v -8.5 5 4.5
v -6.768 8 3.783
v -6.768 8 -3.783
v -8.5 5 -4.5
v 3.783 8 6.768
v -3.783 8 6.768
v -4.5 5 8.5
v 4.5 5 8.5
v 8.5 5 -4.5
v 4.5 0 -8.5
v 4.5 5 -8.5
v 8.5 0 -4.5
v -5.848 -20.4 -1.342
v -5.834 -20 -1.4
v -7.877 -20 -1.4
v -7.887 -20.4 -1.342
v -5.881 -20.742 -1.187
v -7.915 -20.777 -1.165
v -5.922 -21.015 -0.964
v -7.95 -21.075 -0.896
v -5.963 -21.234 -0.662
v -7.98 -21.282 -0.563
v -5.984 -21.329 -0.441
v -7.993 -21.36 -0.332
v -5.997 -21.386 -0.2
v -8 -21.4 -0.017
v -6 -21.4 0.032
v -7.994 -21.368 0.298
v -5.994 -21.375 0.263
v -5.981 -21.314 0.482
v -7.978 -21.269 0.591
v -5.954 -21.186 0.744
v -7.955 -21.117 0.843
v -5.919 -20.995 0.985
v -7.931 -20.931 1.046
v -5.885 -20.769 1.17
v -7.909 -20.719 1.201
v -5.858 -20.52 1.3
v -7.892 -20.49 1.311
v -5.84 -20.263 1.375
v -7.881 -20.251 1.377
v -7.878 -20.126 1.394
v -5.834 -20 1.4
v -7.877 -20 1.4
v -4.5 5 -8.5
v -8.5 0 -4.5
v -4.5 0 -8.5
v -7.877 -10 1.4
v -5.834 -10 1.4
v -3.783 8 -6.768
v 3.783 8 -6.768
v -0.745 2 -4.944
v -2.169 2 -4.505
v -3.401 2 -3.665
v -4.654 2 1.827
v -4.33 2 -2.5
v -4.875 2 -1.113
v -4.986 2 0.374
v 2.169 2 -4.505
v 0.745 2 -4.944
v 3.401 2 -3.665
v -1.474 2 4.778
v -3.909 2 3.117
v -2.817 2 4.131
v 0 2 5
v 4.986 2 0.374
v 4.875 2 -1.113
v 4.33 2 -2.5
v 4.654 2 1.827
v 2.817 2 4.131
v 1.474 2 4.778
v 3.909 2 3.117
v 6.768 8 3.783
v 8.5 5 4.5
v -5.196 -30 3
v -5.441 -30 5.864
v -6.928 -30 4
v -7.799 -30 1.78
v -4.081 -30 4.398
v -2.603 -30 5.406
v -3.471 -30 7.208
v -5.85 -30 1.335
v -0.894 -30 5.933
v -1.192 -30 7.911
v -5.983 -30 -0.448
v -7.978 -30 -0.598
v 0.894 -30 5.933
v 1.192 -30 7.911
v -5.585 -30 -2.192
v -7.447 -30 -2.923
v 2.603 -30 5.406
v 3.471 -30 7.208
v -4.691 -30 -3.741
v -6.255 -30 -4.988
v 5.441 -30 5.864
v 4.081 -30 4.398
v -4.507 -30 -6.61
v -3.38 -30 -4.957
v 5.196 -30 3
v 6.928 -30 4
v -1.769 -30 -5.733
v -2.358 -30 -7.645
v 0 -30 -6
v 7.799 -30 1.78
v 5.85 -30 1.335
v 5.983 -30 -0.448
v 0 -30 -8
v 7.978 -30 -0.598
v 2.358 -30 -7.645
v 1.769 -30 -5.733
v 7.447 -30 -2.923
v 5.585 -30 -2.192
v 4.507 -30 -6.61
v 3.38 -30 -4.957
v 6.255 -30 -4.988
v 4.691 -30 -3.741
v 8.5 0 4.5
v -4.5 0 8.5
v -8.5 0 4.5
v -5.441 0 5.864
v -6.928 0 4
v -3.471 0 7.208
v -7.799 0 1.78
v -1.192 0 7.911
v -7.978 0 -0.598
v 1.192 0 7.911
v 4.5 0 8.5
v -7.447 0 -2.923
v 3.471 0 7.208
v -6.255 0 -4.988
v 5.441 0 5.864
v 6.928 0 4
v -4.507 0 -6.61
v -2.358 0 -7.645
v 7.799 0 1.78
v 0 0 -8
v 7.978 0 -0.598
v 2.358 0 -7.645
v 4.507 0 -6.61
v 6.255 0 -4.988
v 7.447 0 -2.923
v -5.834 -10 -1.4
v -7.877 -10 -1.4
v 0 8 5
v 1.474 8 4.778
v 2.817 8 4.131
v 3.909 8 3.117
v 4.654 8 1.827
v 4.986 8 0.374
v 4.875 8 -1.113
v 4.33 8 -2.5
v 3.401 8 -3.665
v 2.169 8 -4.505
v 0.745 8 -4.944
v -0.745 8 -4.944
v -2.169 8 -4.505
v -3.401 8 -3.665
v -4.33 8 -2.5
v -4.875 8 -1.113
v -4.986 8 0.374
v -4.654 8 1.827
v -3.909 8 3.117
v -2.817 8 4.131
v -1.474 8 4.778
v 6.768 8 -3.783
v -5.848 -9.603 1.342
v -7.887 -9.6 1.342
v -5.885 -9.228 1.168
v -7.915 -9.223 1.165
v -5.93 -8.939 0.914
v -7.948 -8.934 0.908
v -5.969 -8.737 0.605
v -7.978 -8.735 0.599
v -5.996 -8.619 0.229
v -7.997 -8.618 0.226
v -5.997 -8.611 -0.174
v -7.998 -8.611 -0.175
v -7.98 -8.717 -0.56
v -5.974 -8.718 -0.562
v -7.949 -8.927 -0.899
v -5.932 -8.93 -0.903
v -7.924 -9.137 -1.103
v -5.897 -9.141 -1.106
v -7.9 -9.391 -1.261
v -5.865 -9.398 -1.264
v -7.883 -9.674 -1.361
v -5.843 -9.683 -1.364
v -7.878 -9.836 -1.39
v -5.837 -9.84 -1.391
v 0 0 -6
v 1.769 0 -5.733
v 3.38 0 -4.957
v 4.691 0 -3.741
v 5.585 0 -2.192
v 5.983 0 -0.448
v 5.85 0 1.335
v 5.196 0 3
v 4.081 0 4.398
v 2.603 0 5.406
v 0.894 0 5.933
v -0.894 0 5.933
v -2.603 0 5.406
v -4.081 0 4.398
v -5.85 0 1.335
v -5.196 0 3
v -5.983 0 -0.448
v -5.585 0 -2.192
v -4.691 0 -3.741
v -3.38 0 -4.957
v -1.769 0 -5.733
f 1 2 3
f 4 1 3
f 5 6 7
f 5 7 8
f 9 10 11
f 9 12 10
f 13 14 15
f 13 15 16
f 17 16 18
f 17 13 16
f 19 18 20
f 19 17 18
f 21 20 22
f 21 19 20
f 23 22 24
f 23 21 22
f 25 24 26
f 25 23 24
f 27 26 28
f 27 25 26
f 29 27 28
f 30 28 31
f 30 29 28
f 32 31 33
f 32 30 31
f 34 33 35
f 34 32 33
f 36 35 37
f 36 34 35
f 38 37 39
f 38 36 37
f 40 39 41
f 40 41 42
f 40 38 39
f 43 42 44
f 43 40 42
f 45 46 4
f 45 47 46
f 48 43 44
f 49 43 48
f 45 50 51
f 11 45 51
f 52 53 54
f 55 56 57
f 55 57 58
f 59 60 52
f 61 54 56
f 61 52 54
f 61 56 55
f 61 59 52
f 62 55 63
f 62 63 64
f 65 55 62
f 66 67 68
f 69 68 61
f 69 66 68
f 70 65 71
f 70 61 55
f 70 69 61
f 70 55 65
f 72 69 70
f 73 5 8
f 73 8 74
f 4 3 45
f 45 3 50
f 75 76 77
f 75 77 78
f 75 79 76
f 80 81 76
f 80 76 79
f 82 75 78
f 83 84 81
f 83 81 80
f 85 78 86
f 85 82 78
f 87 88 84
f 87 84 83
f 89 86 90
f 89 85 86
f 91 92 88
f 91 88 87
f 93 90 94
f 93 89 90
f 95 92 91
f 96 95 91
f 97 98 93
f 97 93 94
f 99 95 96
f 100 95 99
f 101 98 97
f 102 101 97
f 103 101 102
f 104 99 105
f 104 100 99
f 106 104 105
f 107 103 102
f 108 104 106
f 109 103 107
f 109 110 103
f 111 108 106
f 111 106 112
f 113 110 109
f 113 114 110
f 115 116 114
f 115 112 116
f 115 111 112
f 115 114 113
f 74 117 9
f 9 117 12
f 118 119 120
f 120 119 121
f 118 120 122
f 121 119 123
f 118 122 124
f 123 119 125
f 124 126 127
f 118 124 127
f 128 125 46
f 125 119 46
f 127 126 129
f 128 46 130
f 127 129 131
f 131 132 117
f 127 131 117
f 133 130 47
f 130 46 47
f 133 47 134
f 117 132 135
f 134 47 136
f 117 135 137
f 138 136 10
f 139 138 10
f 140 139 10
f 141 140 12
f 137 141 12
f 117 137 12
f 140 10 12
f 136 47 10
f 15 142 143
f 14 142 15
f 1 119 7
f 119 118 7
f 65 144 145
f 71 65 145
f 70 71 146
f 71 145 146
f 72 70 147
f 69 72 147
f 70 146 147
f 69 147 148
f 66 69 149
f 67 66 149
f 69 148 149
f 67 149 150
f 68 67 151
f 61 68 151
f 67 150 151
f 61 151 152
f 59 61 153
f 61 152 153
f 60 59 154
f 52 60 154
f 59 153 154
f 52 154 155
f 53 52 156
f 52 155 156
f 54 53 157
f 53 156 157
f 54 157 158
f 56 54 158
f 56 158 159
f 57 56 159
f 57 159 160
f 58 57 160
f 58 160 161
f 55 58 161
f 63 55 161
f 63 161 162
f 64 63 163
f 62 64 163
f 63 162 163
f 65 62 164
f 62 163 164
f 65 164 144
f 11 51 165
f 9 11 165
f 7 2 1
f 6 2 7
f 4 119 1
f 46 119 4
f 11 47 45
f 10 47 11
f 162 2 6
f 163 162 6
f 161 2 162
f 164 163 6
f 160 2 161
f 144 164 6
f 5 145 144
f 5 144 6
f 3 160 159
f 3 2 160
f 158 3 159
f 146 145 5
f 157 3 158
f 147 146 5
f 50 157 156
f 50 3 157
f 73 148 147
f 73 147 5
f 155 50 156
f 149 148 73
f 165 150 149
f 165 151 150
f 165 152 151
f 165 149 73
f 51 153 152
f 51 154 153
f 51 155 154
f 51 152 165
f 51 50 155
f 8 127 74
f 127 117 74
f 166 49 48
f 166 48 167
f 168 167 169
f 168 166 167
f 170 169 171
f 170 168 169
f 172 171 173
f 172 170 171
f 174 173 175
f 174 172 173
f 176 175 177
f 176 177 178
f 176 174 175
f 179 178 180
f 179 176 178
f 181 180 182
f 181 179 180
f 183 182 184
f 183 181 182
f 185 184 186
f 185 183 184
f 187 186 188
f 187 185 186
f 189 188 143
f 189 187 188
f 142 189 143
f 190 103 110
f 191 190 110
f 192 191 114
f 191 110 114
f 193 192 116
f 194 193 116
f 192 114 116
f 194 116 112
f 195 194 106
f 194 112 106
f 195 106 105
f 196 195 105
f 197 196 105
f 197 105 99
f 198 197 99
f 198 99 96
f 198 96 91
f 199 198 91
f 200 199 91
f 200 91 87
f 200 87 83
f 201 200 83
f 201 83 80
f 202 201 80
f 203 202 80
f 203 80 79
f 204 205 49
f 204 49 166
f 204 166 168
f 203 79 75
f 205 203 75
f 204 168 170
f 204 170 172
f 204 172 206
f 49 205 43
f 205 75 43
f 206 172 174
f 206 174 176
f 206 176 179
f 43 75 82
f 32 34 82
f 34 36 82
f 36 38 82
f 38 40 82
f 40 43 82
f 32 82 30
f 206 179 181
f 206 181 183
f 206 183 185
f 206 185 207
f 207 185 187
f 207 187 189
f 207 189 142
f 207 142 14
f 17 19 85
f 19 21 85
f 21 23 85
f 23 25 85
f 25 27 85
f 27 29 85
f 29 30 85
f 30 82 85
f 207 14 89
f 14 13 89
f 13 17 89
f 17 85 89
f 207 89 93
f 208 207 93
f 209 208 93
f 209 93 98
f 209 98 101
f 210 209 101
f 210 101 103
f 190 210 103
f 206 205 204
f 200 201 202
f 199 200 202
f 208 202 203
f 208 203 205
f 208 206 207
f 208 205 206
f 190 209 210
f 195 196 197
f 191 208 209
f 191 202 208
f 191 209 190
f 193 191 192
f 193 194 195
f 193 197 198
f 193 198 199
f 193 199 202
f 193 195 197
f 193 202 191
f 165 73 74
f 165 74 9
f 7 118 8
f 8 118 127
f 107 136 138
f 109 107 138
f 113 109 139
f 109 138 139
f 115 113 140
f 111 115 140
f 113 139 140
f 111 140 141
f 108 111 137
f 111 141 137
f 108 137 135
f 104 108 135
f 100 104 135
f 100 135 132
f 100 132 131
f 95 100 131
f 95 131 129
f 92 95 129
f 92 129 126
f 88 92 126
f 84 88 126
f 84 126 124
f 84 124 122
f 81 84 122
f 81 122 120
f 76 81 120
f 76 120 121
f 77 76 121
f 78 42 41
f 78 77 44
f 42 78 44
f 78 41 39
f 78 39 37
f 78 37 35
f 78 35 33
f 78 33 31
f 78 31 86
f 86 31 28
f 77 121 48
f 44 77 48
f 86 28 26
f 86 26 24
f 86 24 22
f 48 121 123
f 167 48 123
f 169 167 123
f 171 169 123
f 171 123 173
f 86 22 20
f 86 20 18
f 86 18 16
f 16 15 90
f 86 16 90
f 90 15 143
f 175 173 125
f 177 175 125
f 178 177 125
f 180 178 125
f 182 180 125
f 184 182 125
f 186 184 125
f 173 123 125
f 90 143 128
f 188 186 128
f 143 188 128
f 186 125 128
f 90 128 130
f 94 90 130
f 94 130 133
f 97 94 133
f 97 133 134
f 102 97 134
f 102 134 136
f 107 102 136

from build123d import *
from OCP.BRepFilletAPI import BRepFilletAPI_MakeChamfer

# Parameters (mm, degrees)
SKETCH1_W           = 17
SKETCH1_H           = 17
BOSS_EXTRUDE1_DEPTH = 8
SKETCH5_R           = 8
BOSS_EXTRUDE3_DEPTH = 30
SKETCH6_R           = 6
CUT_EXTRUDE5_DEPTH  = 30
CUT_EXTRUDE6_DEPTH  = 33.318725222
CHAMFER1_SIZE       = 4
SKETCH11_R          = 5
CUT_EXTRUDE7_DEPTH  = 6
CHAMFER2_SIZE       = 3
CHAMFER2_SIZE2      = 1.732050808


with BuildPart() as part:
    # Sketch1 → Boss-Extrude1 (new body)
    with BuildSketch(Plane(origin=(0, 0, 0), x_dir=(1, 0, 0), z_dir=(0, 1, 0))):
        Rectangle(SKETCH1_W, SKETCH1_H)
    extrude(amount=BOSS_EXTRUDE1_DEPTH)

    # Sketch5 → Boss-Extrude3 (add)
    with BuildSketch(Plane.XZ):
        with Locations(Location((0, 0, 0), (0, 0, 270))):
            Circle(SKETCH5_R)
    extrude(amount=BOSS_EXTRUDE3_DEPTH)

    # Sketch6 → Cut-Extrude5 (cut)
    with BuildSketch(Plane.XZ.offset(30)):
        with Locations(Location((0, 0, 0), (0, 0, 270))):
            Circle(SKETCH6_R)
    extrude(amount=-CUT_EXTRUDE5_DEPTH, mode=Mode.SUBTRACT)

    # Sketch8 → Cut-Extrude6 (cut, through all)
    with BuildSketch(Plane(origin=(0, 0, 0), x_dir=(0, 0, -1), z_dir=(1, 0, 0))):
        with BuildLine():
            Line((-1.4, -20), (-1.4, -10))
            ThreePointArc((-1.4, -10), (0, -8.6), (1.4, -10))
            Line((1.4, -10), (1.4, -20))
            ThreePointArc((1.4, -20), (0, -21.4), (-1.4, -20))
        make_face()
    extrude(amount=-CUT_EXTRUDE6_DEPTH, mode=Mode.SUBTRACT)

    # Chamfer1
    chamfer1_edges = [part.edges().sort_by_distance(p)[0] for p in [
        (8.5, 4, 8.5),
        (-8.5, 4, 8.5),
        (-8.5, 4, -8.5),
        (8.5, 4, -8.5),
    ]]
    chamfer(chamfer1_edges, length=CHAMFER1_SIZE)

    # Sketch11 → Cut-Extrude7 (cut)
    with BuildSketch(Plane(origin=(0, 8, 0), x_dir=(1, 0, 0), z_dir=(0, 1, 0))):
        with Locations(Location((0, 0, 0), (0, 0, 270))):
            Circle(SKETCH11_R)
    extrude(amount=-CUT_EXTRUDE7_DEPTH, mode=Mode.SUBTRACT)

    # Chamfer2: one chamfer whose edges measure the first distance from different faces: ONE call of the kernel's chamfer builder (chamfer() names one face for all edges)
    chamfer2_edges_1 = [part.edges().sort_by_distance(p)[0] for p in [
        (0, 8, 8.5),
    ]]
    chamfer2_side_1 = [part.faces().sort_by_distance(p)[0] for p in [
        (0, 4, 8.5),
    ]]
    chamfer2_edges_2 = [part.edges().sort_by_distance(p)[0] for p in [
        (-8.5, 8, 0),
    ]]
    chamfer2_side_2 = [part.faces().sort_by_distance(p)[0] for p in [
        (-8.5, 4, 0),
    ]]
    chamfer2_edges_3 = [part.edges().sort_by_distance(p)[0] for p in [
        (8.5, 8, 0),
    ]]
    chamfer2_side_3 = [part.faces().sort_by_distance(p)[0] for p in [
        (8.5, 4, 0),
    ]]
    chamfer2_edges_4 = [part.edges().sort_by_distance(p)[0] for p in [
        (0, 8, -8.5),
    ]]
    chamfer2_side_4 = [part.faces().sort_by_distance(p)[0] for p in [
        (0, 4, -8.5),
    ]]
    chamfer2_edges_5 = [part.edges().sort_by_distance(p)[0] for p in [
        (6.5, 8, -6.5),
    ]]
    chamfer2_side_5 = [part.faces().sort_by_distance(p)[0] for p in [
        (6.5, 4, -6.5),
    ]]
    chamfer2_edges_6 = [part.edges().sort_by_distance(p)[0] for p in [
        (-6.5, 8, -6.5),
    ]]
    chamfer2_side_6 = [part.faces().sort_by_distance(p)[0] for p in [
        (-6.5, 4, -6.5),
    ]]
    chamfer2_edges_7 = [part.edges().sort_by_distance(p)[0] for p in [
        (6.5, 8, 6.5),
    ]]
    chamfer2_side_7 = [part.faces().sort_by_distance(p)[0] for p in [
        (6.5, 4, 6.5),
    ]]
    chamfer2_edges_8 = [part.edges().sort_by_distance(p)[0] for p in [
        (-6.5, 8, 6.5),
    ]]
    chamfer2_side_8 = [part.faces().sort_by_distance(p)[0] for p in [
        (-6.5, 4, 6.5),
    ]]
    chamfer2 = BRepFilletAPI_MakeChamfer(part.part.solid().wrapped)
    for e in chamfer2_edges_1:
        chamfer2.Add(CHAMFER2_SIZE, CHAMFER2_SIZE2, e.wrapped, chamfer2_side_1[0].wrapped)  # the first distance lies on this face
    for e in chamfer2_edges_2:
        chamfer2.Add(CHAMFER2_SIZE, CHAMFER2_SIZE2, e.wrapped, chamfer2_side_2[0].wrapped)  # the first distance lies on this face
    for e in chamfer2_edges_3:
        chamfer2.Add(CHAMFER2_SIZE, CHAMFER2_SIZE2, e.wrapped, chamfer2_side_3[0].wrapped)  # the first distance lies on this face
    for e in chamfer2_edges_4:
        chamfer2.Add(CHAMFER2_SIZE, CHAMFER2_SIZE2, e.wrapped, chamfer2_side_4[0].wrapped)  # the first distance lies on this face
    for e in chamfer2_edges_5:
        chamfer2.Add(CHAMFER2_SIZE, CHAMFER2_SIZE2, e.wrapped, chamfer2_side_5[0].wrapped)  # the first distance lies on this face
    for e in chamfer2_edges_6:
        chamfer2.Add(CHAMFER2_SIZE, CHAMFER2_SIZE2, e.wrapped, chamfer2_side_6[0].wrapped)  # the first distance lies on this face
    for e in chamfer2_edges_7:
        chamfer2.Add(CHAMFER2_SIZE, CHAMFER2_SIZE2, e.wrapped, chamfer2_side_7[0].wrapped)  # the first distance lies on this face
    for e in chamfer2_edges_8:
        chamfer2.Add(CHAMFER2_SIZE, CHAMFER2_SIZE2, e.wrapped, chamfer2_side_8[0].wrapped)  # the first distance lies on this face
    add(Compound.cast(chamfer2.Shape()), mode=Mode.REPLACE)


solid = part.part
